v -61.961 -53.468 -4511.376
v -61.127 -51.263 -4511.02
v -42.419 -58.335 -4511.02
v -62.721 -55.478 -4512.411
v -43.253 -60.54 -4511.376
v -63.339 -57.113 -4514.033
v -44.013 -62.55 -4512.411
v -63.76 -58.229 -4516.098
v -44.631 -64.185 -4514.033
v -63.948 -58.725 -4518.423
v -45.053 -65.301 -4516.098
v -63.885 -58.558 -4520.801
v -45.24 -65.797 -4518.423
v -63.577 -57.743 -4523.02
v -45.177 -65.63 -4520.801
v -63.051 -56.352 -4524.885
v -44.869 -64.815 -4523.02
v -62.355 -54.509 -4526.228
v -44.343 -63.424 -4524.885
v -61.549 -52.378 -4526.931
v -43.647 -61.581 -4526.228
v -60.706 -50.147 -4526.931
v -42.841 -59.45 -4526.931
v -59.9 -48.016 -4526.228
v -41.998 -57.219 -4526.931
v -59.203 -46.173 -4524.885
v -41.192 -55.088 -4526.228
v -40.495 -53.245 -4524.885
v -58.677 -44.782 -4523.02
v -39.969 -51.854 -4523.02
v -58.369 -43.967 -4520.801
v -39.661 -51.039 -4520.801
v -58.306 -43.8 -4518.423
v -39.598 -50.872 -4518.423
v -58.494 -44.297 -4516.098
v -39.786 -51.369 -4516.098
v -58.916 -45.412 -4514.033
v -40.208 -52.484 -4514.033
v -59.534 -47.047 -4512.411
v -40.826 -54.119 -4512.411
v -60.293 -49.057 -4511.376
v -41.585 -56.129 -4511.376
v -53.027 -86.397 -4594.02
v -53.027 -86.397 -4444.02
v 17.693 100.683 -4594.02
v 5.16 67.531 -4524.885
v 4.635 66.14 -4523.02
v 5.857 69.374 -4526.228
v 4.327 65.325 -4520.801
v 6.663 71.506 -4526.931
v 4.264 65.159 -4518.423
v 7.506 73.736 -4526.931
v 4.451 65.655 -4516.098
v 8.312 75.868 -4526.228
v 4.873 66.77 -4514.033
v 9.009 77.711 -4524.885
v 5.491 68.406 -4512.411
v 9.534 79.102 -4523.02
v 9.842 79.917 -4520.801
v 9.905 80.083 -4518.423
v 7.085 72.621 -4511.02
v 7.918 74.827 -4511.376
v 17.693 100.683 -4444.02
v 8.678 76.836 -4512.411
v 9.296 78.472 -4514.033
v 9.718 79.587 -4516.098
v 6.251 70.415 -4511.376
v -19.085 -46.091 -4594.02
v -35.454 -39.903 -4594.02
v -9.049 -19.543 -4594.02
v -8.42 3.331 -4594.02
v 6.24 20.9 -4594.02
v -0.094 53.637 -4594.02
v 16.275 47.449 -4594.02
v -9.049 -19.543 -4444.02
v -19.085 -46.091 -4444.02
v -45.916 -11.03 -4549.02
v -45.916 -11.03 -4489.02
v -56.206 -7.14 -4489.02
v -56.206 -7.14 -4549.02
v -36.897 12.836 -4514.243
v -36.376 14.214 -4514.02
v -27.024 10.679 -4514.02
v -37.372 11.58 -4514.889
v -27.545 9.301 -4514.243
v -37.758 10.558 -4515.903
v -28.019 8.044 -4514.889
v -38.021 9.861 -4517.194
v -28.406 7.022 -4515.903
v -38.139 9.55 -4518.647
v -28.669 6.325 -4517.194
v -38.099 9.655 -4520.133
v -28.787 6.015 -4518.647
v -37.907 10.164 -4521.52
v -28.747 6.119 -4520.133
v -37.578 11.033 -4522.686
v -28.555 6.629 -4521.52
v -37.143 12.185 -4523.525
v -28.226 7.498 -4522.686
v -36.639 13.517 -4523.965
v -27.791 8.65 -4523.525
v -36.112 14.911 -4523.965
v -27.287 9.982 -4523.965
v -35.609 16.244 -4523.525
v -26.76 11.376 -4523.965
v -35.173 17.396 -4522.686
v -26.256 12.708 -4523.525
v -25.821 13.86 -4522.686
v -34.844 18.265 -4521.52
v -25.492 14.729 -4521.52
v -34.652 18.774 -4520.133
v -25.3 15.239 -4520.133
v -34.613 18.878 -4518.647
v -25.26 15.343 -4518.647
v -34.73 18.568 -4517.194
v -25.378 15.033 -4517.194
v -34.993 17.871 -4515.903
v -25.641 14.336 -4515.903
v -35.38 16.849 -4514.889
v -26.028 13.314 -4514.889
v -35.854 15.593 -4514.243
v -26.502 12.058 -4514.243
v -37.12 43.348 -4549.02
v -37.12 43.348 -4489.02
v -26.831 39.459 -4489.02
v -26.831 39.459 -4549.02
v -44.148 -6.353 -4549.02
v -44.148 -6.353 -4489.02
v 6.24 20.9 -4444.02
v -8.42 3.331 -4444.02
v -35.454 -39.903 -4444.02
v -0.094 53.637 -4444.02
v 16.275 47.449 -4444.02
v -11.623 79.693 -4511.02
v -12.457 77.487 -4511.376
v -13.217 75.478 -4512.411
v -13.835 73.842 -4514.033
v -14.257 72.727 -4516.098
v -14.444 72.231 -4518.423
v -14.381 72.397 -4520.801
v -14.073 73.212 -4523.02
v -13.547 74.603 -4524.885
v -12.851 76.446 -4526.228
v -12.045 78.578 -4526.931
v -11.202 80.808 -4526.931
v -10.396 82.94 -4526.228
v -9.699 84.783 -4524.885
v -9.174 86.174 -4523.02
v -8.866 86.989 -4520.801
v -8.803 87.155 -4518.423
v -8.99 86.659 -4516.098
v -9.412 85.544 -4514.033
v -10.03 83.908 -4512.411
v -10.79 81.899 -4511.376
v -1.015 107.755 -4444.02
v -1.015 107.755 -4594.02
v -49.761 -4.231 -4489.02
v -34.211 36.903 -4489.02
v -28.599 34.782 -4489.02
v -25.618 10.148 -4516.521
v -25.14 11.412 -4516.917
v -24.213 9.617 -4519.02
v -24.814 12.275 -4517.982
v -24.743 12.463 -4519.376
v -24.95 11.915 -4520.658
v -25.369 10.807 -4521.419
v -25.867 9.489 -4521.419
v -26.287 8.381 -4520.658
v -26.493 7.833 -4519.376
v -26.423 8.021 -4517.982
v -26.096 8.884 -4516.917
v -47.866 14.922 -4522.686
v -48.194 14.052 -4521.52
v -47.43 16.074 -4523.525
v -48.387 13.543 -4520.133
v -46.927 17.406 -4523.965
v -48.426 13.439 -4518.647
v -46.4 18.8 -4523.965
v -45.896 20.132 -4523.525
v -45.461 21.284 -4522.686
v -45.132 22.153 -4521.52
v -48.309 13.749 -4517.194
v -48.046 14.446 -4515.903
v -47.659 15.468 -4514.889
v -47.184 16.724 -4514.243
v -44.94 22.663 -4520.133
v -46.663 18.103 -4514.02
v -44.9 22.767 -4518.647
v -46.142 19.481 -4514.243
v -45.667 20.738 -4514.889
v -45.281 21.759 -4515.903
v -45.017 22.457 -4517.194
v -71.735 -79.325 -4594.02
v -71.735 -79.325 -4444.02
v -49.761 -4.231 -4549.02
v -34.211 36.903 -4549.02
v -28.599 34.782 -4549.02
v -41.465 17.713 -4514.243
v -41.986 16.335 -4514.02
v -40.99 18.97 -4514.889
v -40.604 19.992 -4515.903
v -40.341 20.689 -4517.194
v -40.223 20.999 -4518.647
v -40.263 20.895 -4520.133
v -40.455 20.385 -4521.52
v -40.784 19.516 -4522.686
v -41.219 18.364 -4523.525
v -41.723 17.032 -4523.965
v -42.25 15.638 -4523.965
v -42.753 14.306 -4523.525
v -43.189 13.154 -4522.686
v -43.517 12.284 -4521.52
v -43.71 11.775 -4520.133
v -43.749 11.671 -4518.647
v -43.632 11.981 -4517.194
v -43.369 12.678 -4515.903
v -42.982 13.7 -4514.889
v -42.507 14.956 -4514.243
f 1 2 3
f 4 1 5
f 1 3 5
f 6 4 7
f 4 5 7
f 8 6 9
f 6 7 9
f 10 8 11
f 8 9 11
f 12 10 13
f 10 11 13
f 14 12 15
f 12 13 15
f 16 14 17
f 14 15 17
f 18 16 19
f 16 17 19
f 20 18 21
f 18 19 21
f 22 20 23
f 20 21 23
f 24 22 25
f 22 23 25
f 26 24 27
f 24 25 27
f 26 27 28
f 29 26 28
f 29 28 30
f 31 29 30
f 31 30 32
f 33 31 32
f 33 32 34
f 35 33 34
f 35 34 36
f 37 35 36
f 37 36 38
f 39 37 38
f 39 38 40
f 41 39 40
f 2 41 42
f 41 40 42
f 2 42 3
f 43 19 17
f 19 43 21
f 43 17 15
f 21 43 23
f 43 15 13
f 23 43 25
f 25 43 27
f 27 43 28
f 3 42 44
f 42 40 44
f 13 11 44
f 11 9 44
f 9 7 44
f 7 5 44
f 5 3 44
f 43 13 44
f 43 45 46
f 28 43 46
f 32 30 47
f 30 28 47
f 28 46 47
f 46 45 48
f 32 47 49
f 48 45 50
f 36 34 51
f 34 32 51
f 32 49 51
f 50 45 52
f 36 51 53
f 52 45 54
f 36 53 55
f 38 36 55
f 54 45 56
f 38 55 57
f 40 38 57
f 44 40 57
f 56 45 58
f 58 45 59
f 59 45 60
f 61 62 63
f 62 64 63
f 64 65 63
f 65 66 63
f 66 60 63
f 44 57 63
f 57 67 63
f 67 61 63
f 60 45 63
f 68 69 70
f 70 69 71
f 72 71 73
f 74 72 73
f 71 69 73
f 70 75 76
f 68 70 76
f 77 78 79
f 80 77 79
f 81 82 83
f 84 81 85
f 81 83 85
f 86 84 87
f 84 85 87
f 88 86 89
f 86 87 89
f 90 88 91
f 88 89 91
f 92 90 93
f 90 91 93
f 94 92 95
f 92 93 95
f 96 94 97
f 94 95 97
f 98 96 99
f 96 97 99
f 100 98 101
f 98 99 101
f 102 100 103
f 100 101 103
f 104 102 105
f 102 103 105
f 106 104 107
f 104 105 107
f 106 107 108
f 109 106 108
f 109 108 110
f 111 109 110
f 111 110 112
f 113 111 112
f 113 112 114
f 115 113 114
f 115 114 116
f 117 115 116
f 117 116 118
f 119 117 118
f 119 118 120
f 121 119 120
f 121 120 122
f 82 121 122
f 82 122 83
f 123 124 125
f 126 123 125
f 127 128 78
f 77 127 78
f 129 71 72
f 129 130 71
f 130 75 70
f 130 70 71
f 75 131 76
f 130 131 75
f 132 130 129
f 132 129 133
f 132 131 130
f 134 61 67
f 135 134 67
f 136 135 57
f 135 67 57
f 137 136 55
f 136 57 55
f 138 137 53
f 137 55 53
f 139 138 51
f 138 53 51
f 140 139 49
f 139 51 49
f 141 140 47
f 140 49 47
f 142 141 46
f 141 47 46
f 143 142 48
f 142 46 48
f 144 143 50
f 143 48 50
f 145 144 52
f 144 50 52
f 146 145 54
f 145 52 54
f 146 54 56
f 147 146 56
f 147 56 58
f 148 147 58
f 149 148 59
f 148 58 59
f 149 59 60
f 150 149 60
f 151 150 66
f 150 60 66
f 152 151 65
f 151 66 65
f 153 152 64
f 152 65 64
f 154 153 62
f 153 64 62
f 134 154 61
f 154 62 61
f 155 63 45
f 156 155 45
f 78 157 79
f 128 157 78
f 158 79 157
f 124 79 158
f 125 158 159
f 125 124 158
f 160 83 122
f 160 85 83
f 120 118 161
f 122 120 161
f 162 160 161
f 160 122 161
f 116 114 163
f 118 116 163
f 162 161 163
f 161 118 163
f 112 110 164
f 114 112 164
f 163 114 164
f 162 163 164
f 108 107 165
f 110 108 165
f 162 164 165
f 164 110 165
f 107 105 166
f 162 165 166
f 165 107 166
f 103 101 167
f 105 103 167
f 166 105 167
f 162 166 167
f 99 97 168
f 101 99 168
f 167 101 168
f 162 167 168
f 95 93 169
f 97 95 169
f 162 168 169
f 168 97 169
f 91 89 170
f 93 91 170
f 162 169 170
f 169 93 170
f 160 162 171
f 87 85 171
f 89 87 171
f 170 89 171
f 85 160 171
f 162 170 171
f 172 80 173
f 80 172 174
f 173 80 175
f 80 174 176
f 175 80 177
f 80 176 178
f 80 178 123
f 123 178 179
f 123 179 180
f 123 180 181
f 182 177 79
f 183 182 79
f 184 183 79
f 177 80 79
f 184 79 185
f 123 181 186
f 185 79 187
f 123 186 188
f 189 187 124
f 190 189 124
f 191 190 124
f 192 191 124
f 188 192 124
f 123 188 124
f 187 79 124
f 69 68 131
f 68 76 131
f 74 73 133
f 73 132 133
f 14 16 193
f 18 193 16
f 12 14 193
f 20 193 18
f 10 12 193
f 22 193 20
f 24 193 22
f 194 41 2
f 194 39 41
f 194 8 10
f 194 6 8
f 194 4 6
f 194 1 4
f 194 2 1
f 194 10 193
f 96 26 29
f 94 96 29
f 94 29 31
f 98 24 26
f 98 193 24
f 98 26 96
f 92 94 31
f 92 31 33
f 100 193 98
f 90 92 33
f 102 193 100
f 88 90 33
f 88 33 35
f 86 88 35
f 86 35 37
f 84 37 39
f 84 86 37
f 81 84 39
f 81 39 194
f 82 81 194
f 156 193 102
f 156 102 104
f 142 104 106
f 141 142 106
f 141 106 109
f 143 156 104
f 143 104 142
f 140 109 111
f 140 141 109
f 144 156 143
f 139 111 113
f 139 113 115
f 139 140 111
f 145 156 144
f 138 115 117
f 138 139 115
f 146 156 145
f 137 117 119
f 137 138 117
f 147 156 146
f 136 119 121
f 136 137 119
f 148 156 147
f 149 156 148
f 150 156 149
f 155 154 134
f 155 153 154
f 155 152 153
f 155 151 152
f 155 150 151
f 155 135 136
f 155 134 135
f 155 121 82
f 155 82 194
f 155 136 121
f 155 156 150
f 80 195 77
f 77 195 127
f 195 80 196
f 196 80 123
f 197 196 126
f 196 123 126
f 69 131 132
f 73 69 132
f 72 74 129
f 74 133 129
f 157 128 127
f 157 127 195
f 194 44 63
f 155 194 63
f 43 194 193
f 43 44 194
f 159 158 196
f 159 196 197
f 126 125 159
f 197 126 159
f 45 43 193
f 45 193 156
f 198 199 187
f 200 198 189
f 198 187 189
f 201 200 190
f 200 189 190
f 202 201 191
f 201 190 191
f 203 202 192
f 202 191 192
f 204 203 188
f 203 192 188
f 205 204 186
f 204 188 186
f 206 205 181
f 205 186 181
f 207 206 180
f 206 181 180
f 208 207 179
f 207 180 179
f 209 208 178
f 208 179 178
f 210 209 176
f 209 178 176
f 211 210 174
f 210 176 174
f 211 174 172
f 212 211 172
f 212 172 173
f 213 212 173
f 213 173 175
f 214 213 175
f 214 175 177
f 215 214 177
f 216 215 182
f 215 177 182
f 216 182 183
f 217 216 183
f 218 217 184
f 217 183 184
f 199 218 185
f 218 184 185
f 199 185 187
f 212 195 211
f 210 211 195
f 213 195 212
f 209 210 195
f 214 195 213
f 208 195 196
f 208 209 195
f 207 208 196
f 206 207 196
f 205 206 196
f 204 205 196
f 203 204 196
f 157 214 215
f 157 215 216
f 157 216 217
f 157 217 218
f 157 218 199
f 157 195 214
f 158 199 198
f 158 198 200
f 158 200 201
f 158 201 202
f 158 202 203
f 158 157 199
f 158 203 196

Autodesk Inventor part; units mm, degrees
ref_plane "Work Plane1" through (69.0193, -25.7667, -4444.0205) normal (0, 0, 1) x (0.3536, 0.9354, 0)
sketch "Sketch1" plane through (69.0193, -25.7667, -4444.0205) normal (0, 0, 1) x (0.3536, 0.9354, 0)
  line L0 (-21.7827, 75.2254) -> (-50.1647, 75.2254)
  line L1 (-50.1647, 75.2254) -> (-50.1647, 92.7254)
  line L2 (-50.1647, 92.7254) -> (49.8353, 92.7254)
  line L3 (49.8353, 92.7254) -> (49.8353, 75.2254)
  line L4 (49.8353, 75.2254) -> (21.4533, 75.2254)
  line L5 (-21.7827, 75.2254) -> (-0.1647, 82.7254)
  line L6 (-0.1647, 82.7254) -> (21.4533, 75.2254)
  point P0 (-0.3, 73.6715)
  dimension "d2" = 17.5
  dimension "d3" = 100
  dimension "d35" = 28.382
  dimension "d38" = 50
  dimension "d39" = 7.5
ref_plane "Work Plane2" through (69.0193, -25.7667, -4594.0205) normal (0, 0, -1) x (-0.3536, -0.9354, 0)
extrude "Extrusion1" add sketch "Sketch1" against normal up to surface (150 mm away)
ref_plane "Work Plane3" through (-35.4534, -39.9073, -4594.0205) normal (-0.9354, 0.3536, 0) x (0, 0, 1)
sketch "Sketch2" plane through (-35.4534, -39.9073, -4594.0205) normal (-0.9354, 0.3536, 0) x (0, 0, 1)
  line L0 (150, -49.7) -> (0, -49.7) projected
  line L1 (150, 150.3) -> (0, 150.3) projected
  line L2 (0, -49.7) -> (0, 150.3)
  line L3 (150, -49.7) -> (150, 150.3)
  circle A0 centre (75, -19.7) radius 8 projected
  circle A1 centre (75, 120.3) radius 8 projected
  point P0 (4594.0205, 49.8647)
extrude "Extrusion2" add sketch "Sketch2" along normal blind 20 separate body
ref_plane "Work Plane5" through (-53.0254, -86.3972, -4489.0205) normal (0, 0, 1) x (0.9354, -0.3536, 0)
ref_plane "Work Plane6" through (-53.0254, -86.3972, -4549.0205) normal (0, 0, -1) x (-0.9354, 0.3536, 0)
sketch "Sketch3" plane through (-53.0254, -86.3972, -4489.0205) normal (0, 0, 1) x (0.9354, -0.3536, 0)
  line L0 (-20, 200) -> (-20, 0) projected
  line L1 (17.5, 49.7) -> (17.5, 78.082) projected
  line L2 (17.5, 121.318) -> (17.5, 149.7) projected
  line L3 (-20, 0) -> (-20, 200) projected
  line L4 (-20, 73.0125) -> (-31, 73.0125)
  line L5 (-31, 73.0125) -> (-31, 126.9875)
  line L6 (-31, 126.9875) -> (-20, 126.9875)
  line L7 (-20, 78.0125) -> (-26, 78.0125)
  line L8 (-26, 78.0125) -> (-26, 121.9875)
  line L9 (-26, 121.9875) -> (-20, 121.9875)
  line L10 (-20, 73.0125) -> (-20, 78.0125)
  line L11 (-20, 121.9875) -> (-20, 126.9875)
  line L12 (-31, 100) -> (-26, 100) construction
  line L13 (0, 0) -> (-20, 0) projected
  point P0 (19.0539, 99.5647)
  point P1 (-20, 73.0125)
  point P2 (-20, 78.0125)
  point P3 (-20, 121.9875)
  point P4 (-20, 126.9875)
  dimension "d14" = 5
  dimension "d15" = 100
  dimension "d16" = 11
  dimension "d17" = 26.9875
extrude "Extrusion3" add sketch "Sketch3" against normal up to surface (60 mm away) separate body contours L0 L9 L8 L7 L4 L5 L6
sketch "Sketch4" plane through (-56.2088, -7.1401, -4549.0205) normal (-0.9354, 0.3536, 0) x (0, 0, 1)
  line L0 (60, 53.975) -> (60, 0) projected
  line L1 (60, 53.975) -> (0, 53.975) projected
  circle A0 centre (30, 26.9875) radius 5
  circle A1 centre (30, 96.9875) radius 8 projected
  point P0 (4549.0205, 26.5522)
  dimension "d20" = 30
  dimension "d22" = 10
  dimension "d45" = 70
extrude "Extrusion4" cut sketch "Sketch4" against normal up to next contours A0 bodies 3
sketch "Sketch5" plane through (-54.1616, -32.8361, -4594.0205) normal (-0.9354, 0.3536, 0) x (0, 0, 1)
  circle A0 centre (75, 50.3) radius 5 projected
  point P0 (4594.0205, 49.8647)
hole "Hole1" at (-36.3775, 14.2151, -4519.0205) direction (0.9354, -0.3536, 0) diameter 10 depth 10 tip angle 118 bodies 2
properties part number "Soporte Superior Tubos"
